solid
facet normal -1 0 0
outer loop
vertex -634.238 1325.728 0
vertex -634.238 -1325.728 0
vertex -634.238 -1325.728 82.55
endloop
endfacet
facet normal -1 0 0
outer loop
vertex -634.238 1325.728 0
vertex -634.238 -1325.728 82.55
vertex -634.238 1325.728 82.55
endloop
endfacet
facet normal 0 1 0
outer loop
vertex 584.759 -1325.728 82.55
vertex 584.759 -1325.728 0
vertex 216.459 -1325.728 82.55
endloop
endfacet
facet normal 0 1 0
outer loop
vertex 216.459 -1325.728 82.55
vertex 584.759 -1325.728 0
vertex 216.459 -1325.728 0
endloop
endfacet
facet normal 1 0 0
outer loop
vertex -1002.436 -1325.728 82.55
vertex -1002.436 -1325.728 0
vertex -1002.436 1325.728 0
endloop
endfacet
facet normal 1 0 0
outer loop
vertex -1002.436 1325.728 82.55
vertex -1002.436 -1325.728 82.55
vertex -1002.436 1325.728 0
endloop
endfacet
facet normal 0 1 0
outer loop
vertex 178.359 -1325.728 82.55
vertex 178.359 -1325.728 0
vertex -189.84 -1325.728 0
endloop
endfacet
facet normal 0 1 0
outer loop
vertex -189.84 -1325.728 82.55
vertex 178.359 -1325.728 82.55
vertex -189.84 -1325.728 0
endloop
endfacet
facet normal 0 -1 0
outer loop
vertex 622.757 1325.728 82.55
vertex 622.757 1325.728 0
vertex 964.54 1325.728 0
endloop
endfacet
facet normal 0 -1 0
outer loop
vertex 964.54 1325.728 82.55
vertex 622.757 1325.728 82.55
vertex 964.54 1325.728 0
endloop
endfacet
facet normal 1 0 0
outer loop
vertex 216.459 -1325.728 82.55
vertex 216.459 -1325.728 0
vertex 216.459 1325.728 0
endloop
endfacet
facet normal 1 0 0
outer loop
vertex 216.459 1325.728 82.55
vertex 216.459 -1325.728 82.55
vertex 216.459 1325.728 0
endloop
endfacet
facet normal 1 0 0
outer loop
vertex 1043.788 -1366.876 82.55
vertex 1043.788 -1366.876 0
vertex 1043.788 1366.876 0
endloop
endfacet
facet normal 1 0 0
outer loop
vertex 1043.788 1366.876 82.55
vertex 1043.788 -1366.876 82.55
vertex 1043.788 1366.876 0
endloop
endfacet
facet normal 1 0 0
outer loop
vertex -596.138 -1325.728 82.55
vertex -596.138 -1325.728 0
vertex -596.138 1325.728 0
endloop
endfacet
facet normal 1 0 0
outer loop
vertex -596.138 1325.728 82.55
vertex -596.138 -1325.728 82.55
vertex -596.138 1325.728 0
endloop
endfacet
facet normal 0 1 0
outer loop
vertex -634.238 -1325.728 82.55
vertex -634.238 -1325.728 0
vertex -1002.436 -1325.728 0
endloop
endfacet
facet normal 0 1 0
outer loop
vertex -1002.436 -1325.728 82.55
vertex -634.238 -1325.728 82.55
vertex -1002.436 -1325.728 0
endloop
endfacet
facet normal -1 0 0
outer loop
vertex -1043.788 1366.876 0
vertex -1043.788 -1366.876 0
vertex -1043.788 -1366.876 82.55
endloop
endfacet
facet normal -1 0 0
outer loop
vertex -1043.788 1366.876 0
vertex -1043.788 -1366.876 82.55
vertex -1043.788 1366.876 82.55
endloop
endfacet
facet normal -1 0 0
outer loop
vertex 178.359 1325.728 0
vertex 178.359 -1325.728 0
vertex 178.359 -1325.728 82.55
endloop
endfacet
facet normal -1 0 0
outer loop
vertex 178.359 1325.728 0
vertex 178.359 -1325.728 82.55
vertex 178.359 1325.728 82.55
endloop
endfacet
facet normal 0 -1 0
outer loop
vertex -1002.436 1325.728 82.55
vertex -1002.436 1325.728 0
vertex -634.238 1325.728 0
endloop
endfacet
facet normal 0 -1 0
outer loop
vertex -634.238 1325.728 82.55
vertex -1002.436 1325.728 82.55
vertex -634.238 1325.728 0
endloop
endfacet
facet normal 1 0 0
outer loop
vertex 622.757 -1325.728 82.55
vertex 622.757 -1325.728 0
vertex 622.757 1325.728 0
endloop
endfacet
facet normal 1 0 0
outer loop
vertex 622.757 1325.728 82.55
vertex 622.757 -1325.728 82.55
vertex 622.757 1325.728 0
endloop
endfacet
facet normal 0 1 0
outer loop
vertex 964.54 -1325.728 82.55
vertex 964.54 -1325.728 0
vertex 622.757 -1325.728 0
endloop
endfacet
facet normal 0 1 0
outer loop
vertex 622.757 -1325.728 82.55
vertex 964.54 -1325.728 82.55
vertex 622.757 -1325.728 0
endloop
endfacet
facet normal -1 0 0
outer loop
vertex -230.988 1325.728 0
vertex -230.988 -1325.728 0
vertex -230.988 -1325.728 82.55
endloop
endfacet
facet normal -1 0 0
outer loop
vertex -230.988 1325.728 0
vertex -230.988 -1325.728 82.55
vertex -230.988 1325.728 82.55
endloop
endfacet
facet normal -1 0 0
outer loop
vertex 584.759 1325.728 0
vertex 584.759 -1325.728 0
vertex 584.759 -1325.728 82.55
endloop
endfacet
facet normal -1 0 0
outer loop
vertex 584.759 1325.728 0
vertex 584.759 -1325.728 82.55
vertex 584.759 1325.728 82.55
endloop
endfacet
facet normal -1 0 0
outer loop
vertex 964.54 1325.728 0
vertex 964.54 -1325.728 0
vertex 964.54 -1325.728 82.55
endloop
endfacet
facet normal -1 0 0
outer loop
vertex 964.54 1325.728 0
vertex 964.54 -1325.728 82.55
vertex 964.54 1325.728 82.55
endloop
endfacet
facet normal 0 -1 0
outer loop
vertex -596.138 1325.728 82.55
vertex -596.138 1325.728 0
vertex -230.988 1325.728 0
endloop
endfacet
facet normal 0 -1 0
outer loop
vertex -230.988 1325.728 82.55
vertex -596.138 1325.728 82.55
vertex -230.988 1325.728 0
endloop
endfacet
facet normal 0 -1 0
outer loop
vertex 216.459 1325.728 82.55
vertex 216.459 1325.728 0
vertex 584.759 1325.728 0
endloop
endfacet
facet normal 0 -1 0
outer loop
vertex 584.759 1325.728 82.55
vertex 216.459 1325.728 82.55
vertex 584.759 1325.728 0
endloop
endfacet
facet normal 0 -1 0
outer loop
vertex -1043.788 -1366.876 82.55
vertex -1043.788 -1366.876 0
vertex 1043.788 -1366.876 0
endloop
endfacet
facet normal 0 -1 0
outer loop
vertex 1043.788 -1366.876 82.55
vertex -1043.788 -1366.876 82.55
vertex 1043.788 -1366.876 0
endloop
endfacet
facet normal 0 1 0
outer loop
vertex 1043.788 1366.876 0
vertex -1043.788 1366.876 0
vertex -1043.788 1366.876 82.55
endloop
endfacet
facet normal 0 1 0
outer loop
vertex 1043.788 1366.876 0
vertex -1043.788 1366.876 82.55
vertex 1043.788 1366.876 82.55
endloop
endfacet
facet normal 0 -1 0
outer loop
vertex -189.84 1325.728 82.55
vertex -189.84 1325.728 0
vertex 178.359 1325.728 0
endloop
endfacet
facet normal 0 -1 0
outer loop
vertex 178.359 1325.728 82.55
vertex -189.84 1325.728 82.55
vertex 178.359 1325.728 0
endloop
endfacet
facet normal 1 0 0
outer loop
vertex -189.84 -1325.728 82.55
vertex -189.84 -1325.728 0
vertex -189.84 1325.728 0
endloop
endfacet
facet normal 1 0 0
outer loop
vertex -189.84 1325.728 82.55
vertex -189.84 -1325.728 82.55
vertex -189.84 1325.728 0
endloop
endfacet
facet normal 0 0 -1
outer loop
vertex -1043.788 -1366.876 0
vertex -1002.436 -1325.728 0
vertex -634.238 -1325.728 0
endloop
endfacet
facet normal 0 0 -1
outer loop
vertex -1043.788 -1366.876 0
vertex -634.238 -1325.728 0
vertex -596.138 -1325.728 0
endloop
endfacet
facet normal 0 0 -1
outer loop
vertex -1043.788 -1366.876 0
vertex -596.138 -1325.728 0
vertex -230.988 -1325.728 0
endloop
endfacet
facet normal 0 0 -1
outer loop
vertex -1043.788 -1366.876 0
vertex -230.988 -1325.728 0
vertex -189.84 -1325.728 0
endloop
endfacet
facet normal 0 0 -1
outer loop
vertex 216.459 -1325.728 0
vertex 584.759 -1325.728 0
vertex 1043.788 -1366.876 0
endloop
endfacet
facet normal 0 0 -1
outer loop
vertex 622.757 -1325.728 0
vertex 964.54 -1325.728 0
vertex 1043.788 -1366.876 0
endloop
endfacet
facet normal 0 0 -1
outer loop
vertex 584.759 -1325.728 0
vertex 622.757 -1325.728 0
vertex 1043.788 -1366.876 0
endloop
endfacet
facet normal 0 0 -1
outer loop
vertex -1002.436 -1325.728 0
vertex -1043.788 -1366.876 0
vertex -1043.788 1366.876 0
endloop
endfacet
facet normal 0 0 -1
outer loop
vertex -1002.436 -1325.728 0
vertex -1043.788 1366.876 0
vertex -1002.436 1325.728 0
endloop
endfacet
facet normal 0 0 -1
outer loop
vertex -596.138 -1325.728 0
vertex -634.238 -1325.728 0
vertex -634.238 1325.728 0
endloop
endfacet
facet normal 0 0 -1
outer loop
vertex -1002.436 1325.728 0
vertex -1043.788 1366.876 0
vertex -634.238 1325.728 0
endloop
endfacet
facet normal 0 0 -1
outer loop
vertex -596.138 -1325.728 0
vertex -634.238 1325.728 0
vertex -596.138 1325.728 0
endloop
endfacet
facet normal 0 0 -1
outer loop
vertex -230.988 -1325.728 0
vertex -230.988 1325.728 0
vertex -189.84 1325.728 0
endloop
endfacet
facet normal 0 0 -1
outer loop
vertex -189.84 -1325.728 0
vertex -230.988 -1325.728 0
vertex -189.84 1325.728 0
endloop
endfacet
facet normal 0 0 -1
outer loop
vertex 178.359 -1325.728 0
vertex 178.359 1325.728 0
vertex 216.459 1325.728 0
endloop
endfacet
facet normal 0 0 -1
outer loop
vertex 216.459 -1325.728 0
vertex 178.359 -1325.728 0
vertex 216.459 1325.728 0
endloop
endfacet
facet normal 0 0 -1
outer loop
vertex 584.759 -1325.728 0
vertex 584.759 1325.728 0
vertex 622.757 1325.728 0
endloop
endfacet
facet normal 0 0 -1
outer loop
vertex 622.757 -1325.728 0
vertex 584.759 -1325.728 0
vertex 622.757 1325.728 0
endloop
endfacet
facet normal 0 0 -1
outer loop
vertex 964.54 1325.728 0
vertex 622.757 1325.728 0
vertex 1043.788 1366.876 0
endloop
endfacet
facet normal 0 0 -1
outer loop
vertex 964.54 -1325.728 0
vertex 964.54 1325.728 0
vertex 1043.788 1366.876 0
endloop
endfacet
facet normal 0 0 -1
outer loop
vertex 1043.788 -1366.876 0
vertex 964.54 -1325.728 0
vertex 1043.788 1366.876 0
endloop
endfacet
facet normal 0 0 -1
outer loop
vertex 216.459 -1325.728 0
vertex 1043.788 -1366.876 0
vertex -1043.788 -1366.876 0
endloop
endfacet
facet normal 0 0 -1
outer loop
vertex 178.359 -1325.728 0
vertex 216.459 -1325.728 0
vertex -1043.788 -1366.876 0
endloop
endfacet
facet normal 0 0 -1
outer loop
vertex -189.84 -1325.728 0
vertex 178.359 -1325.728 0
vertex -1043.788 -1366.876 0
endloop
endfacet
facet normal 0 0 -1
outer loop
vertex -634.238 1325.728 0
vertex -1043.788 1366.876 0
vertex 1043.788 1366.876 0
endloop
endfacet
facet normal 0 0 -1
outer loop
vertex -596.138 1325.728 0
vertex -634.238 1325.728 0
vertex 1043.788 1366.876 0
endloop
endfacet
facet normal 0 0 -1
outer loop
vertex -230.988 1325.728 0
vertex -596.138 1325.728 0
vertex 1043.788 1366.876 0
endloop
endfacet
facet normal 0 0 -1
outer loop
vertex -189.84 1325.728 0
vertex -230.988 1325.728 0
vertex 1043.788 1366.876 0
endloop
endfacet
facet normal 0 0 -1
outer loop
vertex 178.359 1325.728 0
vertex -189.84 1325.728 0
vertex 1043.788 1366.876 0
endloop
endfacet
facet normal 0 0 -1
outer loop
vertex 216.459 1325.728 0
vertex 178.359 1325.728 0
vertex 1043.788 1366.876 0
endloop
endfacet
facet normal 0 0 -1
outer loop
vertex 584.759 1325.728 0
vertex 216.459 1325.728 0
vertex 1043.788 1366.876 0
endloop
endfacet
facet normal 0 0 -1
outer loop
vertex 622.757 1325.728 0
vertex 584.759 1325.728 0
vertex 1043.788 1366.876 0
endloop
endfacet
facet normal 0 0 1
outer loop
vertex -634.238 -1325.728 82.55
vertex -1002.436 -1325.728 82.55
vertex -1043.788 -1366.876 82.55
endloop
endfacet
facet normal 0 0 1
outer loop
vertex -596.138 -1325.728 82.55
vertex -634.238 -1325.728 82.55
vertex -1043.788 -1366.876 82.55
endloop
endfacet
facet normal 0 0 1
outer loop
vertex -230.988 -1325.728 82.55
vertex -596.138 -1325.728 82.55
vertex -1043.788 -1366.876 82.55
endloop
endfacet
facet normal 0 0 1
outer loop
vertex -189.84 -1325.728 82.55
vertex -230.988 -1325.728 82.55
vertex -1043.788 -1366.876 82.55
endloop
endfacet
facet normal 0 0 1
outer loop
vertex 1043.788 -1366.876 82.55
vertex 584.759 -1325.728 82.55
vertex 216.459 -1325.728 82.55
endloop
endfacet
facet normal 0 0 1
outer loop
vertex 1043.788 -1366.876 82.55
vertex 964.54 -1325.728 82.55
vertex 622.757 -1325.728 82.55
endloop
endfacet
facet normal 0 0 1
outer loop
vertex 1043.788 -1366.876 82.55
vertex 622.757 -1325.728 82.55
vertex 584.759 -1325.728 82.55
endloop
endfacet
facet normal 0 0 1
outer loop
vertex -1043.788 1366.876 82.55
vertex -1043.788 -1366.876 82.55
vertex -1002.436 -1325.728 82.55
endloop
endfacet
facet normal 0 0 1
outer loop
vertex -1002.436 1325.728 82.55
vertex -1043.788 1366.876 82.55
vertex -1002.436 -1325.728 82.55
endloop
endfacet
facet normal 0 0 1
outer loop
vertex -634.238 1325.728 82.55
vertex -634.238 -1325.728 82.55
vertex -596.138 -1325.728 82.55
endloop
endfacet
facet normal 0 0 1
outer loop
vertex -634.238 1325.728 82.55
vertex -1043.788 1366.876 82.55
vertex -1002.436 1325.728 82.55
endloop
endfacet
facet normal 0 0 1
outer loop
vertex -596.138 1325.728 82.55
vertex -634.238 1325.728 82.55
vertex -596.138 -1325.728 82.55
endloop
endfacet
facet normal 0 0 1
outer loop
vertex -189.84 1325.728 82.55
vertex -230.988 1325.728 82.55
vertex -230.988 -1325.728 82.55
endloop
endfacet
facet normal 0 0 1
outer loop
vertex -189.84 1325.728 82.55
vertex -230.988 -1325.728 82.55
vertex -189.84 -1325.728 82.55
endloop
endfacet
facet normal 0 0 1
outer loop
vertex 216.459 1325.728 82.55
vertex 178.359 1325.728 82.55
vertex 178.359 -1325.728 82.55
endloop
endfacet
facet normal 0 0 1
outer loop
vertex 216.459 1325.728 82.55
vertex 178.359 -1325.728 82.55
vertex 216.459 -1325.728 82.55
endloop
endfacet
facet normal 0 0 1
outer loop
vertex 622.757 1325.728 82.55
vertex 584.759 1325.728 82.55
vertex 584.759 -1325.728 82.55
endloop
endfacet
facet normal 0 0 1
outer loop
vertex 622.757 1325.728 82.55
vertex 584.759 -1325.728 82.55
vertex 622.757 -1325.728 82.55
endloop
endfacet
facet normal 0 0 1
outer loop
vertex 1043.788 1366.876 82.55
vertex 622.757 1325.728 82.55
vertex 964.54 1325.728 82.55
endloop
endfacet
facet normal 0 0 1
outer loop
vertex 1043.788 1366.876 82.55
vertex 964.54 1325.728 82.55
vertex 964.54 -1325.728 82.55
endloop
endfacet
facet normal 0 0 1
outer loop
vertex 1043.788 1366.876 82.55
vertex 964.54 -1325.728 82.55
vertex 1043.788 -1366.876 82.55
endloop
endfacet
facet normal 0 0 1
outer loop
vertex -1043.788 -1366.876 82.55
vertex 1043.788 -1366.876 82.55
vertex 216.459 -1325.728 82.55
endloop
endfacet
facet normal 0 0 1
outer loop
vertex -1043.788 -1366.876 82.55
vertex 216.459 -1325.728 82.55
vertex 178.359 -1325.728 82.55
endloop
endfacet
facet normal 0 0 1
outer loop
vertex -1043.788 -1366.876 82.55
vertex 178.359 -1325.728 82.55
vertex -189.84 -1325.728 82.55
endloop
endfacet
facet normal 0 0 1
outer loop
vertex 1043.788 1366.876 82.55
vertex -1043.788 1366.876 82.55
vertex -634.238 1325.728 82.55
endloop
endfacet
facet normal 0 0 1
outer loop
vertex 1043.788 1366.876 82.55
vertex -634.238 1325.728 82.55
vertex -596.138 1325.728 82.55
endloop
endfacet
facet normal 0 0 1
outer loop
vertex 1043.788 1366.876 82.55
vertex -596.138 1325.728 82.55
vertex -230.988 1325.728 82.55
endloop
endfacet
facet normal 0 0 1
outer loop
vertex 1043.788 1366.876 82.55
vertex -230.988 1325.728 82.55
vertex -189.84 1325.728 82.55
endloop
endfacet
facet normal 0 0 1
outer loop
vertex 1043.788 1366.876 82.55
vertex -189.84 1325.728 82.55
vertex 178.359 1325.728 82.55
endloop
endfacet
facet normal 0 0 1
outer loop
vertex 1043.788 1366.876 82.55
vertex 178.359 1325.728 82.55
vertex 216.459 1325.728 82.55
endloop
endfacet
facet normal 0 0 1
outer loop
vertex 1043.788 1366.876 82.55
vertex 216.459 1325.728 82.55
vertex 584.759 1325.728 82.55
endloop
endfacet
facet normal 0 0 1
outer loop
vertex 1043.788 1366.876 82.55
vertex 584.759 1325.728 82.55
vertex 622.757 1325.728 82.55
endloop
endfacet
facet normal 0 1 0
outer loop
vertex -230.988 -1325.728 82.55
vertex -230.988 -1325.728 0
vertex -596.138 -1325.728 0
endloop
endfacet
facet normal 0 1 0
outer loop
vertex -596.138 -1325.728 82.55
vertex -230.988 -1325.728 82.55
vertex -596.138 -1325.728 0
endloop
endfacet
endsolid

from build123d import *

# Parameters (mm, degrees)
F0_W     = 2087.5752
F0_H     = 2733.7512
F0_W_2   = 38.1
F0_H_2   = 2651.4552
F0_W_3   = 37.9984
F0_W_4   = 41.148
F1_DEPTH = 82.55


# Not quite as in the source:
# - a feature names something its author has since deleted; it is built from what else it names


with BuildPart() as f1:
    # F0 (on Top) → F1 (new body)
    with BuildSketch(Plane.XY):
        Rectangle(F0_W, F0_H)
        Polygon((1002.6396, 1325.7276), (1002.6396, -1325.7276), (964.5396, -1325.7276), (622.7572, -1325.7276), (584.7588, -1325.7276), (216.4588, -1325.7276), (178.3588, -1325.7276), (-189.8396, -1325.7276), (-230.9876, -1325.7276), (-596.138, -1325.7276), (-634.238, -1325.7276), (-1002.4364, -1325.7276), (-1002.4364, 1325.7276), (-634.238, 1325.7276), (-596.138, 1325.7276), (-230.9876, 1325.7276), (-189.8396, 1325.7276), (178.3588, 1325.7276), (216.4588, 1325.7276), (584.7588, 1325.7276), (622.7572, 1325.7276), (964.5396, 1325.7276), align=None, mode=Mode.SUBTRACT)
        with Locations((983.5896, 0)):
            Rectangle(F0_W_2, F0_H_2)
        with Locations((603.758, 0)):
            Rectangle(F0_W_3, F0_H_2)
        with Locations((197.4088, 0)):
            Rectangle(F0_W_2, F0_H_2)
        with Locations((-210.4136, 0)):
            Rectangle(F0_W_4, F0_H_2)
        with Locations((-615.188, 0)):
            Rectangle(F0_W_2, F0_H_2)
    extrude(amount=F1_DEPTH)


solid = f1.part
